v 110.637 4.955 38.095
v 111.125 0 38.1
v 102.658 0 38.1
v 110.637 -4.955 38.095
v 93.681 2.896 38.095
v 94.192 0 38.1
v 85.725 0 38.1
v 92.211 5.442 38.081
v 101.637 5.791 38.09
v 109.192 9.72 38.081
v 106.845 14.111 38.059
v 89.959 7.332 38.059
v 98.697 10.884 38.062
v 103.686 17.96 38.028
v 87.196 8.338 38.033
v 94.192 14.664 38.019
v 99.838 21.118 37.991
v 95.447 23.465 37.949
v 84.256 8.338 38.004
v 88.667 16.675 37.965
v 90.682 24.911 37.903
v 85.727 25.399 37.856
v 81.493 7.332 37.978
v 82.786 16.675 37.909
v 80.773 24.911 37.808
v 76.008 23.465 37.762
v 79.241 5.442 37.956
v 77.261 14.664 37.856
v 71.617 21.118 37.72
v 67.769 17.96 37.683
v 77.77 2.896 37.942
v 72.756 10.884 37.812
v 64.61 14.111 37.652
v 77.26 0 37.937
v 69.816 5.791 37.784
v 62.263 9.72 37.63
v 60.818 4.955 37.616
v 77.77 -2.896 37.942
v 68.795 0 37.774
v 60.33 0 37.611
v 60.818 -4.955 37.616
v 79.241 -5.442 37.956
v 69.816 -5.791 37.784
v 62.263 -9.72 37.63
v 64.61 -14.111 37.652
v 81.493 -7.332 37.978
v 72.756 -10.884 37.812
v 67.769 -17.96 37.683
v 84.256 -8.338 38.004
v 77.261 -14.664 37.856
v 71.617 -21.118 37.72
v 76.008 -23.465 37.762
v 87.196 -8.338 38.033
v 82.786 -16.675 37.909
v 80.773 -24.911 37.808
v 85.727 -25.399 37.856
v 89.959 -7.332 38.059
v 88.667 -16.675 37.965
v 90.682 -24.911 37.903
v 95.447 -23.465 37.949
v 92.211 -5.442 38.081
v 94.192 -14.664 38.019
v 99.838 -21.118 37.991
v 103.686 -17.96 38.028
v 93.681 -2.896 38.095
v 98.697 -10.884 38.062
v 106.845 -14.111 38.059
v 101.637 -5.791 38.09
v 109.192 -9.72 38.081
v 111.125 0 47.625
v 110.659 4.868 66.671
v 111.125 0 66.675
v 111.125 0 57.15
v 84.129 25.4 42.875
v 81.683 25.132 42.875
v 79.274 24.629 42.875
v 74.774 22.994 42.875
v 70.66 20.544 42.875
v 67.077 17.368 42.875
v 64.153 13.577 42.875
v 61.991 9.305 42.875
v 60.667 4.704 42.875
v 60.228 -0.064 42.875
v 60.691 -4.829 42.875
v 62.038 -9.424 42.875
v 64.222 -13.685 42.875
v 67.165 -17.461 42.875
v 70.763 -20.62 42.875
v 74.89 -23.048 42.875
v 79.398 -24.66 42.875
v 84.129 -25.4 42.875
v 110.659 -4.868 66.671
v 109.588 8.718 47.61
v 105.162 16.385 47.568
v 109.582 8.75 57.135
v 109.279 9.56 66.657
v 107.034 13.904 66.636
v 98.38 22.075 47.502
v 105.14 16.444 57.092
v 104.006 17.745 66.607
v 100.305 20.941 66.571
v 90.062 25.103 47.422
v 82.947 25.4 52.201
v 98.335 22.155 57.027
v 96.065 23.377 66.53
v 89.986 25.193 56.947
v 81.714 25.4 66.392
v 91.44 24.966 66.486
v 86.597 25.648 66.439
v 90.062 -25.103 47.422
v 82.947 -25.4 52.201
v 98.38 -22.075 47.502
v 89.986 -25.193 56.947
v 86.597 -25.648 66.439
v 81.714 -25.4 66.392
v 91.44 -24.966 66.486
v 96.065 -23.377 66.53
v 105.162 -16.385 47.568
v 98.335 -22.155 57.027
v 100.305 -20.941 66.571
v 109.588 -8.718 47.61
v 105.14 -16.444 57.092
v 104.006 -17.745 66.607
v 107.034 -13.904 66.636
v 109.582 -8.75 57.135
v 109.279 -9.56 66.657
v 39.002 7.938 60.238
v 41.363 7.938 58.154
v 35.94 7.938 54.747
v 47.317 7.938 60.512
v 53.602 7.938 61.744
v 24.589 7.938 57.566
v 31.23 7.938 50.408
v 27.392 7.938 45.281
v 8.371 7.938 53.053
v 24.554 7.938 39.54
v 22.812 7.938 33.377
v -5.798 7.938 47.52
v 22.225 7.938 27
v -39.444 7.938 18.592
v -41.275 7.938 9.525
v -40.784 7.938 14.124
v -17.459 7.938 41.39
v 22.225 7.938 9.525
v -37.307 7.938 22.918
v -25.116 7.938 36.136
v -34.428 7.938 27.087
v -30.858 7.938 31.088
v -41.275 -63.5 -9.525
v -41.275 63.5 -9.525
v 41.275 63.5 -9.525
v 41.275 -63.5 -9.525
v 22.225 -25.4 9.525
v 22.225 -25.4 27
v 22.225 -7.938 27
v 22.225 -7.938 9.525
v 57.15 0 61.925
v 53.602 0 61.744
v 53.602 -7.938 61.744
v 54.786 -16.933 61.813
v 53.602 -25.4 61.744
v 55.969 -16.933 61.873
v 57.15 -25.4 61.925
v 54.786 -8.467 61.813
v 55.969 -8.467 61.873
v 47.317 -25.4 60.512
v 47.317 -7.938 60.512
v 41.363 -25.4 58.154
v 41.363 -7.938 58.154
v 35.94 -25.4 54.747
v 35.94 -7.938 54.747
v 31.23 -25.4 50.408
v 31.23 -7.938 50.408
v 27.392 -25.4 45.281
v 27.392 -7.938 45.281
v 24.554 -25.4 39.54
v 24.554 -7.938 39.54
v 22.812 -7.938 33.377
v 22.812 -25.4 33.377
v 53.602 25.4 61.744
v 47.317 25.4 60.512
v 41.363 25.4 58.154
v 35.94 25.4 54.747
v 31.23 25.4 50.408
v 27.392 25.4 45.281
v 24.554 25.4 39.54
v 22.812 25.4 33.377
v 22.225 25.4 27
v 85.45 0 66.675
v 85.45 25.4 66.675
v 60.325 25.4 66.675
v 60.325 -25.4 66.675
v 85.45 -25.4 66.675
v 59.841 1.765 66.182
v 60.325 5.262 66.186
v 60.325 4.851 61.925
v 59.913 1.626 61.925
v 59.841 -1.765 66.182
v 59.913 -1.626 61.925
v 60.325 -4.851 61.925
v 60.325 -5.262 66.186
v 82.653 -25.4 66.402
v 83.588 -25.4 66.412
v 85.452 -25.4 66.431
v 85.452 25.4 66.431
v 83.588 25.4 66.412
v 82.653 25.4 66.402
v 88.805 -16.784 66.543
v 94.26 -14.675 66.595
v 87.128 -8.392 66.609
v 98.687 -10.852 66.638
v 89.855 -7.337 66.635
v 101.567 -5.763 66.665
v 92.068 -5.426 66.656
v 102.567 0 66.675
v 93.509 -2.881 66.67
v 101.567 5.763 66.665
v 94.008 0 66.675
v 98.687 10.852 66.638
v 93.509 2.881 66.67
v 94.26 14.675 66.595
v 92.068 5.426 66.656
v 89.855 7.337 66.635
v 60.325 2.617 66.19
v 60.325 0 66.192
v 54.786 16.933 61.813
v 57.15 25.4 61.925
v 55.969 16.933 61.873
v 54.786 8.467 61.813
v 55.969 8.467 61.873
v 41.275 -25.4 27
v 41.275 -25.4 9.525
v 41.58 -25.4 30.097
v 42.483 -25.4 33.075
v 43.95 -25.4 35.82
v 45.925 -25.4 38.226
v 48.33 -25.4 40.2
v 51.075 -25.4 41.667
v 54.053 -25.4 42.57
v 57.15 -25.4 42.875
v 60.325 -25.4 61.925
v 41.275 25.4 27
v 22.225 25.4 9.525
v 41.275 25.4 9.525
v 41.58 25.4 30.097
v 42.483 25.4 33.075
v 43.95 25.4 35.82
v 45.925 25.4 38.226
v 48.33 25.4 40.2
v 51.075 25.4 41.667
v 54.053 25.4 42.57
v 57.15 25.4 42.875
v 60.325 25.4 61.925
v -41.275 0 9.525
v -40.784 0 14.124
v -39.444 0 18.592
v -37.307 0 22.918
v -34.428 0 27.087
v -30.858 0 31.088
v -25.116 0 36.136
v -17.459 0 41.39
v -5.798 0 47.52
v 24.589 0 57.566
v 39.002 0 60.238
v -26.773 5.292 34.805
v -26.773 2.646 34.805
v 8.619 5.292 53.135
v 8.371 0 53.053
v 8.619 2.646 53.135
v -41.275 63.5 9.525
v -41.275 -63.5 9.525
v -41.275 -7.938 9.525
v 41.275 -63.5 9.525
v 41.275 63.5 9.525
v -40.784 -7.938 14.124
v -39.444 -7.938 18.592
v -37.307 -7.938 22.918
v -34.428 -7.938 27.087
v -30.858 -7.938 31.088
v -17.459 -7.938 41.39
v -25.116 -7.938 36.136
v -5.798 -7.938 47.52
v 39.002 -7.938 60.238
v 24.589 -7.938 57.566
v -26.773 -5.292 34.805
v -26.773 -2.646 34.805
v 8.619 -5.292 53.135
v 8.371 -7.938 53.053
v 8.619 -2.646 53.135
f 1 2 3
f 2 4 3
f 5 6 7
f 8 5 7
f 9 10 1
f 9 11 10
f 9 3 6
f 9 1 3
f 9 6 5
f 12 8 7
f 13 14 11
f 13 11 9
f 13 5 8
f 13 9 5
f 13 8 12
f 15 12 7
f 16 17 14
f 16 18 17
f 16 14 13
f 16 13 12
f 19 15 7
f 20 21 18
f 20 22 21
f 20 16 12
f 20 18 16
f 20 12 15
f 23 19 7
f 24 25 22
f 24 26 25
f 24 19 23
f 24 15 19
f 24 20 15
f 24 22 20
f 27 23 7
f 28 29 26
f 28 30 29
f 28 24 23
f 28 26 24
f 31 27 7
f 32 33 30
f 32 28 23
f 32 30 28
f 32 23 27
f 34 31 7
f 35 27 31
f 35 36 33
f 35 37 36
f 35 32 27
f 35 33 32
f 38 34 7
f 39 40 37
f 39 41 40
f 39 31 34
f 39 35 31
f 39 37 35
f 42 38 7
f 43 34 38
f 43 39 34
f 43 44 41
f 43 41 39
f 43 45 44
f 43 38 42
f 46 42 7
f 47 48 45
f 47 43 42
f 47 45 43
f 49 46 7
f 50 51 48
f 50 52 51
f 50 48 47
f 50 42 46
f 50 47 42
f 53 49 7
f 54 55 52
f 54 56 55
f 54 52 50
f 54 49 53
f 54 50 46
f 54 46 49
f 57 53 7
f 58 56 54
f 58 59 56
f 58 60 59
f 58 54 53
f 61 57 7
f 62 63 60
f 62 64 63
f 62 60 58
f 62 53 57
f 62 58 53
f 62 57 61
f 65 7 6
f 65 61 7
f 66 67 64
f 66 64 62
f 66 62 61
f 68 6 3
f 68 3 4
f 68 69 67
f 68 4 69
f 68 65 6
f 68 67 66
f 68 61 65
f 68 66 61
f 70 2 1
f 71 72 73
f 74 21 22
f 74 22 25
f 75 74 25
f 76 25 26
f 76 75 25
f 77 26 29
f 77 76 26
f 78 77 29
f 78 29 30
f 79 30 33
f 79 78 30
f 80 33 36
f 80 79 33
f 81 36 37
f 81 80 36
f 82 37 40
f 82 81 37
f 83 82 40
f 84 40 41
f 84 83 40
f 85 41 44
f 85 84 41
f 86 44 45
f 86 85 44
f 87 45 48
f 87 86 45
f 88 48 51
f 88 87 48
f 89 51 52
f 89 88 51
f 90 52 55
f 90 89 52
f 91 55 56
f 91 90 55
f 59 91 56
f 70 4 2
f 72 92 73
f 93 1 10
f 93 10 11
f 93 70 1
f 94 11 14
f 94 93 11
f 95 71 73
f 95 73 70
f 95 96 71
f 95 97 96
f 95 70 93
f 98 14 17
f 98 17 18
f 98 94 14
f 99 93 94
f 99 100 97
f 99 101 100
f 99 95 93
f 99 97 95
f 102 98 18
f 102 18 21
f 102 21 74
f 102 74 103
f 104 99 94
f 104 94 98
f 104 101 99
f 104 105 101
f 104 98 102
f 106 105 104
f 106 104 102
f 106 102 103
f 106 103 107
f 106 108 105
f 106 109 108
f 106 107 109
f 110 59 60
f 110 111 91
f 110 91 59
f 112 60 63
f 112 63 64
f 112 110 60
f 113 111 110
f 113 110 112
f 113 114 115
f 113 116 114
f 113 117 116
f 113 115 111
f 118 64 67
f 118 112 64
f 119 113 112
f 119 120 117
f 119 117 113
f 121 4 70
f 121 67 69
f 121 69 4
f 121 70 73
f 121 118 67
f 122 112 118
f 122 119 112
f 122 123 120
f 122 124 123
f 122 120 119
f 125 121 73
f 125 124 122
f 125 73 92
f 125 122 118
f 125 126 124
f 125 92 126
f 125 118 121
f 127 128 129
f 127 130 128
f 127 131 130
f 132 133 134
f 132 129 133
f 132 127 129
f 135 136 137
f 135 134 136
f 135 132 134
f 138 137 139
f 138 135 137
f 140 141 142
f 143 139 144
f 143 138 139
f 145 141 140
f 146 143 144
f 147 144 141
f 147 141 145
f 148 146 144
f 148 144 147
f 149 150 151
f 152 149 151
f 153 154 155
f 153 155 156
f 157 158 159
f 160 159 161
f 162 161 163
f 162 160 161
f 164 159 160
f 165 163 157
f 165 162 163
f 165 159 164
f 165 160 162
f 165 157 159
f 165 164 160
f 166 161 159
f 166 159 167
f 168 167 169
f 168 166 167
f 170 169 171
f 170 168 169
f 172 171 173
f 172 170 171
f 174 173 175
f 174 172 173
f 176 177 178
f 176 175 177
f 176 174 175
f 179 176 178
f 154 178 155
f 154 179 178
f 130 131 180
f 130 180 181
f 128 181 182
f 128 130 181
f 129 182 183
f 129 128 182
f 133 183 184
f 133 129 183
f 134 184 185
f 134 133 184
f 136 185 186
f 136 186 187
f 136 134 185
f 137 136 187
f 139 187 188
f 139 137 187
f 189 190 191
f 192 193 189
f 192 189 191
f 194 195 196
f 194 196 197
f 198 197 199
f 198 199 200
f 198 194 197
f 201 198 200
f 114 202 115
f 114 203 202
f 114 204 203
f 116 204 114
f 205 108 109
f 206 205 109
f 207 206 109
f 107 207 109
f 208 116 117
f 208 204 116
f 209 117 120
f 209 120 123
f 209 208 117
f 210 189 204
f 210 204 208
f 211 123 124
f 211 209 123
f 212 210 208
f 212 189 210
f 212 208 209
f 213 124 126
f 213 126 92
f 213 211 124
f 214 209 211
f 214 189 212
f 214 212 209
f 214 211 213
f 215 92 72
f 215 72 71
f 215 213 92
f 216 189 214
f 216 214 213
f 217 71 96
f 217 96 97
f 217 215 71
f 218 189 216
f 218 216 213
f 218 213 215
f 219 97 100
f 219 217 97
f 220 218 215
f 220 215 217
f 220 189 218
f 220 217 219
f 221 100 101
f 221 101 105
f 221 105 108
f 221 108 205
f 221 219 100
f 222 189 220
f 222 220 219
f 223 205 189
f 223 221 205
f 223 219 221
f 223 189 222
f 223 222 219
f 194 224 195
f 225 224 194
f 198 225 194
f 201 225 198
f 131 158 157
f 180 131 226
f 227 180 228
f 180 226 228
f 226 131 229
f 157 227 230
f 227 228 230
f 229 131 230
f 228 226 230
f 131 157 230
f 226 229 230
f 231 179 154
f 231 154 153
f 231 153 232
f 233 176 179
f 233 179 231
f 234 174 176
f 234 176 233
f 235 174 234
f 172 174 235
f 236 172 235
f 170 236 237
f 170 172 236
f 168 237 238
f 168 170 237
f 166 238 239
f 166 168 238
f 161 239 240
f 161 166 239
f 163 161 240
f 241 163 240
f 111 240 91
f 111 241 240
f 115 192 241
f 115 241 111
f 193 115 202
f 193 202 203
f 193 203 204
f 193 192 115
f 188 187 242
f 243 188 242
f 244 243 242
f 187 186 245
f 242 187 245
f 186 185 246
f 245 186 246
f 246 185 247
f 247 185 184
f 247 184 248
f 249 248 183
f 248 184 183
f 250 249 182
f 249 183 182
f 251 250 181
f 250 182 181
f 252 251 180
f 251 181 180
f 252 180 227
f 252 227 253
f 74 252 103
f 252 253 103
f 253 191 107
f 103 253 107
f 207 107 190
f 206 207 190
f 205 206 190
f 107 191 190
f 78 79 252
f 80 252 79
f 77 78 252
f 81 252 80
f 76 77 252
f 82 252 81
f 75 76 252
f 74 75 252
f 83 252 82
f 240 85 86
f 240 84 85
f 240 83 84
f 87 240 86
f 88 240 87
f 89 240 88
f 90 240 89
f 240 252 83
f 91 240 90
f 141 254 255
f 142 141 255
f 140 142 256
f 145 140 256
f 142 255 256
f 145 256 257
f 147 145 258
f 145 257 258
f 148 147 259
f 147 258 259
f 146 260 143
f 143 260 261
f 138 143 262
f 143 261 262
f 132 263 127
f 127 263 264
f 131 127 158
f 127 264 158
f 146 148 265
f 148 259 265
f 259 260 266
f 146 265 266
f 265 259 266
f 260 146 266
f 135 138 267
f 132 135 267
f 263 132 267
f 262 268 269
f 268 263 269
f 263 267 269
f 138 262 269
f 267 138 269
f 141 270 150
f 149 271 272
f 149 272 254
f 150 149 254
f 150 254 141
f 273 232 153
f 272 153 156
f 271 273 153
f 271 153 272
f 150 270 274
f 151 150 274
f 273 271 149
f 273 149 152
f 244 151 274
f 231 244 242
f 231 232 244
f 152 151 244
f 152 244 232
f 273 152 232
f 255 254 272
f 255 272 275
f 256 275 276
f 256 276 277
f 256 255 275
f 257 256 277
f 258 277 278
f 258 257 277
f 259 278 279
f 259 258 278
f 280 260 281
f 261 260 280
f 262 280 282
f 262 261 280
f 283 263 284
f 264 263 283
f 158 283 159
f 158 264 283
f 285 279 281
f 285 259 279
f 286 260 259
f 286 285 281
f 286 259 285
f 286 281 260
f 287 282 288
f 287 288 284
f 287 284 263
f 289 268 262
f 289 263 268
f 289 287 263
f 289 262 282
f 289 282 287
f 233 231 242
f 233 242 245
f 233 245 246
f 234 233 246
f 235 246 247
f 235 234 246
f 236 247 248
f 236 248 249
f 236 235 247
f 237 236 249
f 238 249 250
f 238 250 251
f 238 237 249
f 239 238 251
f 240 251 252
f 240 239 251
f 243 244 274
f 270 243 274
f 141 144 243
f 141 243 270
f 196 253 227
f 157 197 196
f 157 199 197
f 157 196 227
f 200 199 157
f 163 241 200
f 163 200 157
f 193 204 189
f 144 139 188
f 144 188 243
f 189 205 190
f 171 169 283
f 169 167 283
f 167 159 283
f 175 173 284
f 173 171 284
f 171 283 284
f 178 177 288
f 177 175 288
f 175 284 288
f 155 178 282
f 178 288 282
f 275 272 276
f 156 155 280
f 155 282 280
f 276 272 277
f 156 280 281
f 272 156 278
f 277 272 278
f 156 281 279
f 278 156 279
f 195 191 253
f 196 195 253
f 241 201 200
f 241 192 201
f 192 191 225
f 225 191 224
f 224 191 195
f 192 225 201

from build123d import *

# Parameters (mm, degrees)
F1_DEPTH = 63.5
F2_DEPTH = 25.4
F3_DEPTH = 7.9375


with BuildPart() as f1:
    # F0 (on Front) → F1 (new body, symmetric)
    with BuildSketch(Plane.XZ):
        Polygon((22.225, 9.525), (-41.275, 9.525), (-41.275, -9.525), (41.275, -9.525), (41.275, 9.525), align=None)
    extrude(amount=F1_DEPTH, both=True)

    # F0 (on Front) → F2 (join, symmetric)
    with BuildSketch(Plane.XZ):
        with BuildLine():
            Line((22.225, 27.0002), (22.225, 9.525))
            Line((22.225, 9.525), (41.275, 9.525))
            Line((41.275, 9.525), (41.275, 27.0002))
            ThreePointArc((41.275, 27.0002), (45.9246798487, 38.2255201513), (57.15, 42.8752))
            Line((57.15, 42.8752), (60.325, 42.8752))
            Line((60.325, 42.8752), (60.325, 61.9252))
            Line((60.325, 61.9252), (57.15, 61.9252))
            add(Edge.make_bspline(
                [(53.6016861152, 61.7444814514), (54.7864461989, 61.817216834), (55.9695068539, 61.8775273392), (57.15, 61.9252)],
                knots=[108.7054668937, 108.7054668937, 108.7054668937, 108.7054668937, 111.5045361635, 111.5045361635, 111.5045361635, 111.5045361635], degree=3))
            ThreePointArc((53.6016861152, 61.7444814514), (31.2301187558, 50.4077923855), (22.225, 27.0002))
        make_face()
        Polygon((60.325, 66.675), (60.325, 61.9252), (60.325, 42.8752), (85.6790583176, 42.8752), (85.4500830173, 66.675), align=None)
    extrude(amount=F2_DEPTH, both=True)

    # F0 (on Front) → F3 (join, symmetric)
    with BuildSketch(Plane.XZ):
        with BuildLine():
            add(Edge.make_bspline(
                [(-41.275, 9.525), (-40.9848631129, 37.3550228275), (7.5899995014, 58.9197090153), (53.6016861152, 61.7444814514)],
                knots=[0, 0, 0, 0, 108.7054668937, 108.7054668937, 108.7054668937, 108.7054668937], degree=3))
            Line((-41.275, 9.525), (22.225, 9.525))
            Line((22.225, 9.525), (22.225, 27.0002))
            ThreePointArc((22.225, 27.0002), (31.2301187558, 50.4077923855), (53.6016861152, 61.7444814514))
        make_face()
    extrude(amount=F3_DEPTH, both=True)

    # F0 (on Front) → F4 (revolve)
    with BuildSketch(Plane.XZ):
        Polygon((85.4500830173, 66.675), (85.6790583176, 42.8752), (85.725, 38.1), (111.125, 38.1), (111.125, 66.675), align=None)
    revolve(axis=Axis((85.5875415087, 0, 52.3875), (-0.0096204465, 0, 0.9999537224)))


solid = f1.part
